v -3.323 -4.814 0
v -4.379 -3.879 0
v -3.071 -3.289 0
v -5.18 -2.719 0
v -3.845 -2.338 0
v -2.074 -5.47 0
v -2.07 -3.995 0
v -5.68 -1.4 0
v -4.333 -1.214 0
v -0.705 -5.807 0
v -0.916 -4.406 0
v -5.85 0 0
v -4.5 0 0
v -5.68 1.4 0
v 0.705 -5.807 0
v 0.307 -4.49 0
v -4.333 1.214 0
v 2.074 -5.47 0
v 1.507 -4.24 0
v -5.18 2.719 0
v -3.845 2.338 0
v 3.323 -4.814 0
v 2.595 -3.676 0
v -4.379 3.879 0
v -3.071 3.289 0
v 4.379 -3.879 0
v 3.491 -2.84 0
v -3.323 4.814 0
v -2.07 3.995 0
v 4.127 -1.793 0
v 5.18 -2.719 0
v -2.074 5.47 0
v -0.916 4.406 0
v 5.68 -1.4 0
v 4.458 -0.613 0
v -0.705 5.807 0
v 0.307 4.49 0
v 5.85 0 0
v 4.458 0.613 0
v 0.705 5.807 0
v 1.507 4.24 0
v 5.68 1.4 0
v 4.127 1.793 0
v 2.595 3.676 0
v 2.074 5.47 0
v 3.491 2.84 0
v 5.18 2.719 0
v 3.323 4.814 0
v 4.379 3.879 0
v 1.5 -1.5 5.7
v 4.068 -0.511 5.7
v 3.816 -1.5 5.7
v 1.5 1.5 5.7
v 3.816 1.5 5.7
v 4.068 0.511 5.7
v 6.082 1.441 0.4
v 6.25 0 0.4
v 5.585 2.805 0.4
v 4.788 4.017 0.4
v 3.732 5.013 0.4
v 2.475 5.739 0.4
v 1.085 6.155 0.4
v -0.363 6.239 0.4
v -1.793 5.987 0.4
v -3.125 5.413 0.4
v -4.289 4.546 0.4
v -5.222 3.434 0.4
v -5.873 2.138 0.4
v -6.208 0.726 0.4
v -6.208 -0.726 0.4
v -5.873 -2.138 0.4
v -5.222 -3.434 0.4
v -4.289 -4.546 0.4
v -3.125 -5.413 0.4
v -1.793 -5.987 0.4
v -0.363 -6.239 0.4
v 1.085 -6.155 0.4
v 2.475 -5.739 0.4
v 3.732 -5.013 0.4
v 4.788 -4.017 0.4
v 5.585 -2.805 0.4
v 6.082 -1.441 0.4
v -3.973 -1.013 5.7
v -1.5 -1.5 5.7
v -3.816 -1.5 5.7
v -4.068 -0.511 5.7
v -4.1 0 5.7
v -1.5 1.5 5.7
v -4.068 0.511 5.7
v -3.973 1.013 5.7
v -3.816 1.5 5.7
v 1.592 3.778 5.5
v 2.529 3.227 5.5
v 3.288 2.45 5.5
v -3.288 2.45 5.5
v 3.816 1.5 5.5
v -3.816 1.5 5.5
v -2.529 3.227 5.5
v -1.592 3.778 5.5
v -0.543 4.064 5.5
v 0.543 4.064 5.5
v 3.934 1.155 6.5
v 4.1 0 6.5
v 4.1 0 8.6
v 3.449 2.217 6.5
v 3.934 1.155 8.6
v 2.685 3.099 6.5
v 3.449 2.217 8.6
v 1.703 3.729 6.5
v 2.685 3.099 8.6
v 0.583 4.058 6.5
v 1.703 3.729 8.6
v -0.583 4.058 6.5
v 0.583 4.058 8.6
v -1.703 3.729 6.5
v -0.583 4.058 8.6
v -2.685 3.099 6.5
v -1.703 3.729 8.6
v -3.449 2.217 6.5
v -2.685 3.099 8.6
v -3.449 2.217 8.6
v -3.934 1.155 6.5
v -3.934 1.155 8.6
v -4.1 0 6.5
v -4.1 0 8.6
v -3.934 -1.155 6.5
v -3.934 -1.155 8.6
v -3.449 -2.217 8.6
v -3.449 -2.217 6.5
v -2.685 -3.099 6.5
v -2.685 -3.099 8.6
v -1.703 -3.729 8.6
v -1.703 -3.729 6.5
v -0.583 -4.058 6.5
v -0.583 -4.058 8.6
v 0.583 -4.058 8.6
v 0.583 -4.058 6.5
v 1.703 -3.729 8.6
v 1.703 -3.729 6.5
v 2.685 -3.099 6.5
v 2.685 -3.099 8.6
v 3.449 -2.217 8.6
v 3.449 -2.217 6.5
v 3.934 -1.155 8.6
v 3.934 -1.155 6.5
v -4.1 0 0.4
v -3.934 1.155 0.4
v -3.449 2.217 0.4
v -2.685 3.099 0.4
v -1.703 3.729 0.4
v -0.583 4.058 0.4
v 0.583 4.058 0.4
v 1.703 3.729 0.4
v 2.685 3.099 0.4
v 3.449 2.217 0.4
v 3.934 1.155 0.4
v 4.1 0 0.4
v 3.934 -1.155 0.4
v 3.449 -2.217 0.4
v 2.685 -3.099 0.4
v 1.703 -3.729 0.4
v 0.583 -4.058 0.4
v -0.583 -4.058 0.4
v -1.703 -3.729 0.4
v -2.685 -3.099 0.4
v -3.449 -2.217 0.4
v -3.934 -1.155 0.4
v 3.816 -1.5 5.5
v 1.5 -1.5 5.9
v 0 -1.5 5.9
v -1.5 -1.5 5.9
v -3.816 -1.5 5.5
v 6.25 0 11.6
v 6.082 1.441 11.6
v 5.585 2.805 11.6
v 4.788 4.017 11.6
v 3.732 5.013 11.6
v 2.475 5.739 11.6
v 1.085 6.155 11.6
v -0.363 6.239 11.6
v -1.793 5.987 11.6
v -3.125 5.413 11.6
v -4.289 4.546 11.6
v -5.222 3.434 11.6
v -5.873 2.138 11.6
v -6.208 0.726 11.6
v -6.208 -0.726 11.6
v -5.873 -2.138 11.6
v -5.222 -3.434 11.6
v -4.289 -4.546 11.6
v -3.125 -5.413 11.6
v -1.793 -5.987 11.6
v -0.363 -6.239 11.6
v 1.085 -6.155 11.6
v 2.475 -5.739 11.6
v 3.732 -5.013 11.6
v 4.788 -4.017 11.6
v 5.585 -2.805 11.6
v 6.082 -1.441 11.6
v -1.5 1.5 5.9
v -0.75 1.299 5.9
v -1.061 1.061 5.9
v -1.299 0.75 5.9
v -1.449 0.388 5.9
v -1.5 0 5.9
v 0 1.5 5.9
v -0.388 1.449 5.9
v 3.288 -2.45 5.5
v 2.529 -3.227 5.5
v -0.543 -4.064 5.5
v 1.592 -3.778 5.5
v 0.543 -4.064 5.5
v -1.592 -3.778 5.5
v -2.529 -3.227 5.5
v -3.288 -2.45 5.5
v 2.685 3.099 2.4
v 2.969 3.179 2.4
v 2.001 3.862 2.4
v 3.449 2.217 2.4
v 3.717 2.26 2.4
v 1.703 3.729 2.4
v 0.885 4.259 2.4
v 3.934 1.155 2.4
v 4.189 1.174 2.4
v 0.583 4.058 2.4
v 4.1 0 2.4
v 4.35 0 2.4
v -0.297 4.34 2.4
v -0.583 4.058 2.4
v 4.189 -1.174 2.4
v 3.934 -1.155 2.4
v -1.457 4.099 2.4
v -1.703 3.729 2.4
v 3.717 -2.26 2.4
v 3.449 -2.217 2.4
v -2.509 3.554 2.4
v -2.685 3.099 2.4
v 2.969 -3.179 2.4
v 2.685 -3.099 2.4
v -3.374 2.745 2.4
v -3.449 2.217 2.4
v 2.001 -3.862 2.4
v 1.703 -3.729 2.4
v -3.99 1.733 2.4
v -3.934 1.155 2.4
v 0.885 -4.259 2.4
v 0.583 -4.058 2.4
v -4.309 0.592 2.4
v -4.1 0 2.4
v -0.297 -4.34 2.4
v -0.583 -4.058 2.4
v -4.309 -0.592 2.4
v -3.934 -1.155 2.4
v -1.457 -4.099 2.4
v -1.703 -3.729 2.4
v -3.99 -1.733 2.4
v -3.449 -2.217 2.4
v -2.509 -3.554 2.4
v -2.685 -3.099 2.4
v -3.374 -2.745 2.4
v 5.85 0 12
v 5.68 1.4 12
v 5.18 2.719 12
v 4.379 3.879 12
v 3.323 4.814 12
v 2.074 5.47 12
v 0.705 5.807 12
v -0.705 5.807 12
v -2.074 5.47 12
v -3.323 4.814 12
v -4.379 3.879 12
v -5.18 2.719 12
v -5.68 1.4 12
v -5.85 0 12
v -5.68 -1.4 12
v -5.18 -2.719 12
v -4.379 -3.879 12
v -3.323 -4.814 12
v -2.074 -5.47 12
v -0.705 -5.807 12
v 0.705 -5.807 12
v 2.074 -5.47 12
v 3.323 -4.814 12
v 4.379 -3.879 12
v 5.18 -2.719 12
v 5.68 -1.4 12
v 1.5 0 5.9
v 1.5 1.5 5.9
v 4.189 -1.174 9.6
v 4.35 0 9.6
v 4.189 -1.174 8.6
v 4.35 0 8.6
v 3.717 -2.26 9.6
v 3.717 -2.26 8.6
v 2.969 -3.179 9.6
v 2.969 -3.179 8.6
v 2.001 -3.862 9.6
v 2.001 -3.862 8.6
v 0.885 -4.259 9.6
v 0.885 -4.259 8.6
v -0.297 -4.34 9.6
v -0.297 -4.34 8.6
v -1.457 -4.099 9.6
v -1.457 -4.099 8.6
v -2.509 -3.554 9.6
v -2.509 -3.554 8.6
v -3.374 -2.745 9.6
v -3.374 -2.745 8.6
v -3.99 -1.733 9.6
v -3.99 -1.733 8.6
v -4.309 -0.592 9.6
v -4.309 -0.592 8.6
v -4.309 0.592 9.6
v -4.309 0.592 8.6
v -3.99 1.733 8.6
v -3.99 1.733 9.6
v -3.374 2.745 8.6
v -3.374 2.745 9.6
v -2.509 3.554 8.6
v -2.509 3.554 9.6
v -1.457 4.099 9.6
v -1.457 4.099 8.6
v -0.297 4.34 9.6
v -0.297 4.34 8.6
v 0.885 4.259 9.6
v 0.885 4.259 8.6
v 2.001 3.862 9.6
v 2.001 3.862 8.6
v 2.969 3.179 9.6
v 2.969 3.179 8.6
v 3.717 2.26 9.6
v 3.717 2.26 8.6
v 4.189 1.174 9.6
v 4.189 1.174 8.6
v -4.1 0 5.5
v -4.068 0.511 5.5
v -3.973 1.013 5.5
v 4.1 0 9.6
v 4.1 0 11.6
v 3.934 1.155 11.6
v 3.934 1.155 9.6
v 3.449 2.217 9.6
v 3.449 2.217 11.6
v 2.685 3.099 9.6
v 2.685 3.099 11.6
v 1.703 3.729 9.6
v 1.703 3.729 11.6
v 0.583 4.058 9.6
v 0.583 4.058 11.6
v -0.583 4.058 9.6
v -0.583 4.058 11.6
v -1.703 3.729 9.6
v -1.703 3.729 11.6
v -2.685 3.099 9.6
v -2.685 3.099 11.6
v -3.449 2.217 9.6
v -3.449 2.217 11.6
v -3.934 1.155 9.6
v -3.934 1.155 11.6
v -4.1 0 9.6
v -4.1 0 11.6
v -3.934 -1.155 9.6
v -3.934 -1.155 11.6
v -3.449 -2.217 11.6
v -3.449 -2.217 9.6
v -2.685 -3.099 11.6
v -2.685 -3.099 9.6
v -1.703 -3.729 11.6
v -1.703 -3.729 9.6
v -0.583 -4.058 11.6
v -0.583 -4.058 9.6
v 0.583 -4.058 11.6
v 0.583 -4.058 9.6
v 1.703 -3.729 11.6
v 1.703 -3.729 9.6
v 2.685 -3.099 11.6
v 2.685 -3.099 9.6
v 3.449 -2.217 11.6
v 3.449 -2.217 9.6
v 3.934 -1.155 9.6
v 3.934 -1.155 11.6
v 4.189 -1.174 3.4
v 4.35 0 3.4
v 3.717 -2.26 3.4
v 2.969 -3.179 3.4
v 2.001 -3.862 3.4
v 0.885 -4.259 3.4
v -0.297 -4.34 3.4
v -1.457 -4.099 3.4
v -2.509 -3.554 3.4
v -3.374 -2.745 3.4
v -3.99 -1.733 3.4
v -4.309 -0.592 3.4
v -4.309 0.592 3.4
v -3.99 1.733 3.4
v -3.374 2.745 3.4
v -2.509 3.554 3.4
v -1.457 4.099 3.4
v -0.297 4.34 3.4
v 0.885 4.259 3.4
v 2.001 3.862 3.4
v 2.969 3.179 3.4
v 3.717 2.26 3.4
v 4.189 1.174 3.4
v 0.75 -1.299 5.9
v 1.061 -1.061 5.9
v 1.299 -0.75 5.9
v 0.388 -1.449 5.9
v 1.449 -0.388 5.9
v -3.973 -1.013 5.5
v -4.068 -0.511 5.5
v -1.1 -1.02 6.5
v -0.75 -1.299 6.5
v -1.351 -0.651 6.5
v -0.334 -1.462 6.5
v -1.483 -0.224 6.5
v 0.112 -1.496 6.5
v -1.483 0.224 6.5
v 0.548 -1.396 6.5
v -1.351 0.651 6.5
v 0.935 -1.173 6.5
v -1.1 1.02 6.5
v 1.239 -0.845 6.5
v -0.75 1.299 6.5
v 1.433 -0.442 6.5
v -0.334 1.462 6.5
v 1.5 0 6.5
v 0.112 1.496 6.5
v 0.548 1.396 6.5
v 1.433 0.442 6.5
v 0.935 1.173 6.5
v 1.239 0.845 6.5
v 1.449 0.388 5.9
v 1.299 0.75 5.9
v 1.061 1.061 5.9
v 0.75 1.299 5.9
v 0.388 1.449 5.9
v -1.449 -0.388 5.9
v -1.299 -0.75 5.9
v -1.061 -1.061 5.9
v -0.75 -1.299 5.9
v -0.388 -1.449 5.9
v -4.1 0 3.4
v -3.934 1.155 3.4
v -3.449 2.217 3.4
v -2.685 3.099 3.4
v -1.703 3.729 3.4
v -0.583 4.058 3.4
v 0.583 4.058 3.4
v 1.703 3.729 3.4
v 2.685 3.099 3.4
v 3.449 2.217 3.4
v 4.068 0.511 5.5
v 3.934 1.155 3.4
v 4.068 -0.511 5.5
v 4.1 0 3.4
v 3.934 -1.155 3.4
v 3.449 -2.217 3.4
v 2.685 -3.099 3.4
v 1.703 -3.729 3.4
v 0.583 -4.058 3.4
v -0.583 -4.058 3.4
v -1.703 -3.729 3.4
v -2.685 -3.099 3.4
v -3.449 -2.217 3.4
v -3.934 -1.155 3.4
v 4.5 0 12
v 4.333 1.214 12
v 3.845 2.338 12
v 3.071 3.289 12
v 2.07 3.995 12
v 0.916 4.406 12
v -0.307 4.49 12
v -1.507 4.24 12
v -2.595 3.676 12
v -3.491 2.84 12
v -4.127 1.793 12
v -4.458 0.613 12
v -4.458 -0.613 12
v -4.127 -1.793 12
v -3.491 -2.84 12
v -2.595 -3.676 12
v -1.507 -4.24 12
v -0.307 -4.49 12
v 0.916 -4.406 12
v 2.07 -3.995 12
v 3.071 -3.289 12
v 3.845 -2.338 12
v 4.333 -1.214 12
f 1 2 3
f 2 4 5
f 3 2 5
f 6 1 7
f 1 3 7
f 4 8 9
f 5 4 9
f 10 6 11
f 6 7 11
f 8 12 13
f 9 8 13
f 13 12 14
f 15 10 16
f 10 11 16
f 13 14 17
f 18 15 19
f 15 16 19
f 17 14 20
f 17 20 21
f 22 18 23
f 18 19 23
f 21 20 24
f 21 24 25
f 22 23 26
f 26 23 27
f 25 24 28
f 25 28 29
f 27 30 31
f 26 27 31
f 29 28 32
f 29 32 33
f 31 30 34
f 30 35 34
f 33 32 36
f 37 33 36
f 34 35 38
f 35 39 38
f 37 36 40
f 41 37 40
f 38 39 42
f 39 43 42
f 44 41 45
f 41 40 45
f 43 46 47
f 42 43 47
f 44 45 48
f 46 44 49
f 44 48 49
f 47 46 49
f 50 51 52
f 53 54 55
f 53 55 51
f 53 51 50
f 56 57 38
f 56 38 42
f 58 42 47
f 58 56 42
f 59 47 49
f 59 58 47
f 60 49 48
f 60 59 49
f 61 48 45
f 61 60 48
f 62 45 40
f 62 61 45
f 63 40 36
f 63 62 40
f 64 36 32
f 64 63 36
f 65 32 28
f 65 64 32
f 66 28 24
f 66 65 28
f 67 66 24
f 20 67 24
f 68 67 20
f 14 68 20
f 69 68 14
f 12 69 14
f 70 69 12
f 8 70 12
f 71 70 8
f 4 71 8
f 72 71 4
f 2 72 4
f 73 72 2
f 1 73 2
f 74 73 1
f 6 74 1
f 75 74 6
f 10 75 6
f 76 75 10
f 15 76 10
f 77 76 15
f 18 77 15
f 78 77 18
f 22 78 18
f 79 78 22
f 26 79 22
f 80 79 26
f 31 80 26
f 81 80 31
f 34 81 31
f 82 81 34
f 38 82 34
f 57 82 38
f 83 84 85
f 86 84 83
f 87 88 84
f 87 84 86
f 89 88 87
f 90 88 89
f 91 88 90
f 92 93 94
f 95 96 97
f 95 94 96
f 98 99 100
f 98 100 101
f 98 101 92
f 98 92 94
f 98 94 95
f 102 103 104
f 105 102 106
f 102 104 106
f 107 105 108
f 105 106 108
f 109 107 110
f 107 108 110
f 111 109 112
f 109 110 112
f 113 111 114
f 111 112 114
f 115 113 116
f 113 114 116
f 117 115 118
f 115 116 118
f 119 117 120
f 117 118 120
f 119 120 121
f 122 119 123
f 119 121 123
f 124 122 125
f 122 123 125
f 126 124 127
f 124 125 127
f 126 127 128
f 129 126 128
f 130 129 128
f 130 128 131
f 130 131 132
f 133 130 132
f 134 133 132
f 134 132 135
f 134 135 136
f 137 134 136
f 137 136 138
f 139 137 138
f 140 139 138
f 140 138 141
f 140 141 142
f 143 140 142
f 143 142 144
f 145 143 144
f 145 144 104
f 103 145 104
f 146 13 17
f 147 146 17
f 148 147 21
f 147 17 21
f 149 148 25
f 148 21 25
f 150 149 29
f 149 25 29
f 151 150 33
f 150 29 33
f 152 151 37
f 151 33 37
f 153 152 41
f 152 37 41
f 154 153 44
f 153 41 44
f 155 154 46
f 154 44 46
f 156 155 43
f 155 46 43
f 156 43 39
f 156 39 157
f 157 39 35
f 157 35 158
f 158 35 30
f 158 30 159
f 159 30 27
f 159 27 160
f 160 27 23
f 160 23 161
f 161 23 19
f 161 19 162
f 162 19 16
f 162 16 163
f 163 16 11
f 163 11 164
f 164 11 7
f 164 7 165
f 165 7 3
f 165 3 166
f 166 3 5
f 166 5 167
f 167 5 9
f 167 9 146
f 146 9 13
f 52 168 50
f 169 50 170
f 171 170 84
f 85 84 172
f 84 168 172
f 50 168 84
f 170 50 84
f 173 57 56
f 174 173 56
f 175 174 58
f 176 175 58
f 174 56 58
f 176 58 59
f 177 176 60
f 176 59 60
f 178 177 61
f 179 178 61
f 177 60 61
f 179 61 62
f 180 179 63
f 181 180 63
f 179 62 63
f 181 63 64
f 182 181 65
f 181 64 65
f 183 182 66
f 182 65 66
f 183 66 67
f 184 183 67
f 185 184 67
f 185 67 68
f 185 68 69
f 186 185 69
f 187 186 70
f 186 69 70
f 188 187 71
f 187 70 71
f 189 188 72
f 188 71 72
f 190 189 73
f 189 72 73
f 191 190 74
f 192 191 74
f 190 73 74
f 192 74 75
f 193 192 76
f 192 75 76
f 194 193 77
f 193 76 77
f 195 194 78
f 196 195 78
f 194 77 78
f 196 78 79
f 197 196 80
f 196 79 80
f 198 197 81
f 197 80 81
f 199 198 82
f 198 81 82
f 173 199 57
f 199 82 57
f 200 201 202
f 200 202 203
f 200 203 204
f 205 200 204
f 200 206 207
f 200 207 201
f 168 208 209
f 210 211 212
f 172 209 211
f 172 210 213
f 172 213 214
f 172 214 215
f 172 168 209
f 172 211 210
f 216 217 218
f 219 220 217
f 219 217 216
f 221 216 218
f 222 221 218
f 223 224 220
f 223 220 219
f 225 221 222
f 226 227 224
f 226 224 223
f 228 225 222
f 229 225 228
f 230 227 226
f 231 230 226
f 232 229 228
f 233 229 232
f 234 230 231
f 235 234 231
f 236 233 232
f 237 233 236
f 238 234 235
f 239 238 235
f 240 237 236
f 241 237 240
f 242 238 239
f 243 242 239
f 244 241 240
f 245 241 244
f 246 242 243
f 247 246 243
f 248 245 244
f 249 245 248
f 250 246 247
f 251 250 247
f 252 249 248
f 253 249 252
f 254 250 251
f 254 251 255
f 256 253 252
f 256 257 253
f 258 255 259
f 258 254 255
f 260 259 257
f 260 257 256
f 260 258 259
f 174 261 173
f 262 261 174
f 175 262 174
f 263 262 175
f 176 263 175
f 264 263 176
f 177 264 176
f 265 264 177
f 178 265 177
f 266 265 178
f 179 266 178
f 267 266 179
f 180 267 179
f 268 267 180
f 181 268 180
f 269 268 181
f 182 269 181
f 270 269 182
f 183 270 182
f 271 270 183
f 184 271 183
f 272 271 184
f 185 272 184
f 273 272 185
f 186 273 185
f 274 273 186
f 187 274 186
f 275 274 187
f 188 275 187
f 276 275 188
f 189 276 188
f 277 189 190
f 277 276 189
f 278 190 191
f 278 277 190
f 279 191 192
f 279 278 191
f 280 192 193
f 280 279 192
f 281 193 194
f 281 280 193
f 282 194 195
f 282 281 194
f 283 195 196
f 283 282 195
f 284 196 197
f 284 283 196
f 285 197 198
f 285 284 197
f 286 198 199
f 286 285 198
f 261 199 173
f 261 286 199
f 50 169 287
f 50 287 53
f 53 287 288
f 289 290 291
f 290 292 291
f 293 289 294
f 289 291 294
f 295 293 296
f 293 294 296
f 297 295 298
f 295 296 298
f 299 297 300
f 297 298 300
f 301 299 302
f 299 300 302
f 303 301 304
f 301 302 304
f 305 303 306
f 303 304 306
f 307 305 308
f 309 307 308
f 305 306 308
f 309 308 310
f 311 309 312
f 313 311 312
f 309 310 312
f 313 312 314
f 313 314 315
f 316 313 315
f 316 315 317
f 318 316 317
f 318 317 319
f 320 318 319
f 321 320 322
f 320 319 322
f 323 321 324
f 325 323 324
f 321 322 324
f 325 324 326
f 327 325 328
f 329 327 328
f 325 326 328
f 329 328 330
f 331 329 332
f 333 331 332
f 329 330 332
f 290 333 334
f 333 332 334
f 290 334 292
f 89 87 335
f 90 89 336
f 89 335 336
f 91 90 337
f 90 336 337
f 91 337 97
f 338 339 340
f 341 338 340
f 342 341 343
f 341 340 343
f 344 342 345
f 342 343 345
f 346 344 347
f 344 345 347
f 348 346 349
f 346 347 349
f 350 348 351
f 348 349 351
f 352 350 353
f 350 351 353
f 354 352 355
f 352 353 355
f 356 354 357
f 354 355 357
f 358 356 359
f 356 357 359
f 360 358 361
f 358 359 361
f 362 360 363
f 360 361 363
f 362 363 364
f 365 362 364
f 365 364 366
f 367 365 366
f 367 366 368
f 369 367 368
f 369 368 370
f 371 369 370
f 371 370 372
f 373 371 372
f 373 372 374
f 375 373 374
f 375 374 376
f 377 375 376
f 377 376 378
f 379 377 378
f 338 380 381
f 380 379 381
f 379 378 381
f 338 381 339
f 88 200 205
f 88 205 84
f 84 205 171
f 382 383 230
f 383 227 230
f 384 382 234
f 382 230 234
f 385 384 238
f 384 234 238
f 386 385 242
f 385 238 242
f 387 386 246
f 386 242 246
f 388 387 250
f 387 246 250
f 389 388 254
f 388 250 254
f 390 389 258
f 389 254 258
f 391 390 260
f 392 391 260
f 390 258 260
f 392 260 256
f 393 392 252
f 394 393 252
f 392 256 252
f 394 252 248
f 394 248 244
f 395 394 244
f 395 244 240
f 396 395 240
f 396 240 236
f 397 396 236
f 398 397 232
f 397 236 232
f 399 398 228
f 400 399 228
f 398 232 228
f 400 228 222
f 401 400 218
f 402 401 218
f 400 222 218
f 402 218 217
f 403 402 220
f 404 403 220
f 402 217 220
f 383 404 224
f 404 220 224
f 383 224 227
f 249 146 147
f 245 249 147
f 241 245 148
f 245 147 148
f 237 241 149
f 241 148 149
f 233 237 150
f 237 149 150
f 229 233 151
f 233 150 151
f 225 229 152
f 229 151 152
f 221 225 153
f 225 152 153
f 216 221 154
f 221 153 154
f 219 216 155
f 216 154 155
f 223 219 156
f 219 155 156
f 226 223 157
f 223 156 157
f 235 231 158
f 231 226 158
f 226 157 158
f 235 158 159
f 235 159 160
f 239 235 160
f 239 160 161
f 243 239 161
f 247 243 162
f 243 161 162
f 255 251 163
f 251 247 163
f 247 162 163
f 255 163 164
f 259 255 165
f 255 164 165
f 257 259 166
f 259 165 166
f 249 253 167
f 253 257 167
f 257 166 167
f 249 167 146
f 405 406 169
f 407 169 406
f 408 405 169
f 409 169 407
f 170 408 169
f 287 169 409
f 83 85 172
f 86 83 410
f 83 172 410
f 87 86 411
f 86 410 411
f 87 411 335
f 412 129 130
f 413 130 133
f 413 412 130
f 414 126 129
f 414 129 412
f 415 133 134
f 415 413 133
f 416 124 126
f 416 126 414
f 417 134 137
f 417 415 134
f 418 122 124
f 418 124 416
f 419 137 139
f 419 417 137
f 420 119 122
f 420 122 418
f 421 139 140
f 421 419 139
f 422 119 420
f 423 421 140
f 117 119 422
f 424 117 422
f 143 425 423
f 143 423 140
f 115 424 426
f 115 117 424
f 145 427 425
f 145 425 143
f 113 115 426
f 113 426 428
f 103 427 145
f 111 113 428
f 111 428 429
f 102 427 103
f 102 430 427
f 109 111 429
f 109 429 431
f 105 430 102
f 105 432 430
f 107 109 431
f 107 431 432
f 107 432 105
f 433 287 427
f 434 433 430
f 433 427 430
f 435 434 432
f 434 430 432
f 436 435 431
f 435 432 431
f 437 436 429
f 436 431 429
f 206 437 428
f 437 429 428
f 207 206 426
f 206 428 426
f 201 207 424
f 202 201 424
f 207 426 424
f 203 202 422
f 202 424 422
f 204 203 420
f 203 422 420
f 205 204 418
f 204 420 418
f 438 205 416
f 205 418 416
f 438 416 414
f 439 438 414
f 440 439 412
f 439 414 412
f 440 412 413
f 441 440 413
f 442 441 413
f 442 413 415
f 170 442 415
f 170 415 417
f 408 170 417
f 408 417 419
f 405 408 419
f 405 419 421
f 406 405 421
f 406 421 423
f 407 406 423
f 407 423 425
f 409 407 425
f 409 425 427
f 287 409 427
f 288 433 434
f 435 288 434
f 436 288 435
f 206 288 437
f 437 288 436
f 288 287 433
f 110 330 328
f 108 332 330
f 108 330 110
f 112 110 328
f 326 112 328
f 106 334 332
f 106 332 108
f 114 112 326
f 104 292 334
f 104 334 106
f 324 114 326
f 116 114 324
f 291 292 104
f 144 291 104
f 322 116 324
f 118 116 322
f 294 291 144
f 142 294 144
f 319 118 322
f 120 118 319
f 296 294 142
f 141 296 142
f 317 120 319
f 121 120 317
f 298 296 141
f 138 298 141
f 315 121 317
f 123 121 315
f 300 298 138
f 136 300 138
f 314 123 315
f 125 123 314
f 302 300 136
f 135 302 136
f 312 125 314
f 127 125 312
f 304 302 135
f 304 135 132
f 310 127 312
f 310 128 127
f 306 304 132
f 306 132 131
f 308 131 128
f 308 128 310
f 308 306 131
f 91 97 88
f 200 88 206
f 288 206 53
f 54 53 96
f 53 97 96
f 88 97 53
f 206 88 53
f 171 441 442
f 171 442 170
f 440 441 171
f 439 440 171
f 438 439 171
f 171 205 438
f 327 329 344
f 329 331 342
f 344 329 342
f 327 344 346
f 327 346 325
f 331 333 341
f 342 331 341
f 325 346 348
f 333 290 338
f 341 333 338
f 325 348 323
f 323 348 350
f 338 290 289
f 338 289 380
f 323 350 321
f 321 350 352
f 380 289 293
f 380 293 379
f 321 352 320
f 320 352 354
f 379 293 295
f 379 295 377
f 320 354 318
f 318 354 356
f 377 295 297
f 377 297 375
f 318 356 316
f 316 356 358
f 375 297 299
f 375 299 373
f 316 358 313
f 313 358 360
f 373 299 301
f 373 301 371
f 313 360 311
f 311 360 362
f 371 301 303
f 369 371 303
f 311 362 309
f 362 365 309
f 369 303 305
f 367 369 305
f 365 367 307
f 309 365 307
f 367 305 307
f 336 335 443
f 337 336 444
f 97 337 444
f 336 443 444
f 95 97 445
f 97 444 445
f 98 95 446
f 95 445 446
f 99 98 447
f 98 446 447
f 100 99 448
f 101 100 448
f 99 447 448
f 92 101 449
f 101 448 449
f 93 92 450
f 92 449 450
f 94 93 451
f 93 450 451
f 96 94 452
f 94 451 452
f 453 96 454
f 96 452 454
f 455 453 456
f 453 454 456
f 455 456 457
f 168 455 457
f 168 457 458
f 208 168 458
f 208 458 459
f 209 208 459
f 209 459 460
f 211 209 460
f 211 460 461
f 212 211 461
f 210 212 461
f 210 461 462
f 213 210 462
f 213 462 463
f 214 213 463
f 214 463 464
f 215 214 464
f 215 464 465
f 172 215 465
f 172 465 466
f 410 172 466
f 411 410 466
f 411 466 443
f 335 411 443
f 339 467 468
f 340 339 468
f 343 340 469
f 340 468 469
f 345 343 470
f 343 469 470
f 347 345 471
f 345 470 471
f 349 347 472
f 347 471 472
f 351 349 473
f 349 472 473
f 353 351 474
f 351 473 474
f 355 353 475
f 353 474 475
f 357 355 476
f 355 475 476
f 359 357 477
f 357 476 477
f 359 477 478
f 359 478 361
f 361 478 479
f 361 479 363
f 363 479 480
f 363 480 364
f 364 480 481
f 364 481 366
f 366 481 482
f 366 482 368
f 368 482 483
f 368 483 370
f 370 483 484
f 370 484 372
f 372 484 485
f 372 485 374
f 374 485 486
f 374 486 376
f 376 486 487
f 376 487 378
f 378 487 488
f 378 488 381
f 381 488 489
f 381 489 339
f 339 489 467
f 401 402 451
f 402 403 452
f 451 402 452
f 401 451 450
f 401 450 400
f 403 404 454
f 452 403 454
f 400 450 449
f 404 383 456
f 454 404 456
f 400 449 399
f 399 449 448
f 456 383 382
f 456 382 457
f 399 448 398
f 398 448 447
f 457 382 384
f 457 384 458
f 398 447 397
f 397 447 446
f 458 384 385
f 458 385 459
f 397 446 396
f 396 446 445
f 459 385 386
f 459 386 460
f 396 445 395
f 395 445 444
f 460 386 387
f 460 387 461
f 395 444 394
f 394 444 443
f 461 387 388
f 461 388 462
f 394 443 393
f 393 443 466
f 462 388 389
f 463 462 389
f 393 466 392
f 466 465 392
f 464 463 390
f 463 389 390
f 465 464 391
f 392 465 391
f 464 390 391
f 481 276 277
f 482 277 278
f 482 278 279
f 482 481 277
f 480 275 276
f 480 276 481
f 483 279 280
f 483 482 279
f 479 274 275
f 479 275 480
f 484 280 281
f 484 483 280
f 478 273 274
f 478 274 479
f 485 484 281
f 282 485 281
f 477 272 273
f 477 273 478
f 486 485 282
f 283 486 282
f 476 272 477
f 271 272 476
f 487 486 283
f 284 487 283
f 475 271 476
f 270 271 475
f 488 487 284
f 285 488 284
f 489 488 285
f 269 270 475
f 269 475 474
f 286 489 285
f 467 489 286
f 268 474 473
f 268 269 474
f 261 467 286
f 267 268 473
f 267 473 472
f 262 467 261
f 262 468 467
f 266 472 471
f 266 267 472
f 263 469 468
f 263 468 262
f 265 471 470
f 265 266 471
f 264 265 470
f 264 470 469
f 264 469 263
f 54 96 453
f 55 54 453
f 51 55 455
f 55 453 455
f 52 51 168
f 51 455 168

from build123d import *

# Parameters (mm, degrees)
SKETCH1_R           = 6.25
BOSS_EXTRUDE1_DEPTH = 12
CUT_EXTRUDE1_REACH  = 14
SKETCH2_R           = 1.5
SKETCH3_R           = 4.1
CUT_EXTRUDE2_DEPTH  = 5.5
SKETCH4_R           = 4.1
CUT_EXTRUDE3_DEPTH  = 5.5
SKETCH5_W           = 0.25
SKETCH5_H           = 1
CUT_EXTRUDE4_DEPTH  = 0.4
BOSS_EXTRUDE2_DEPTH = 0.2
CHAMFER1_SIZE       = 0.4


with BuildPart() as part:
    # Sketch1 → Boss-Extrude1 (new body)
    with BuildSketch(Plane.XY):
        Circle(SKETCH1_R)
    extrude(amount=BOSS_EXTRUDE1_DEPTH)

    # Sketch2 → Cut-Extrude1 (cut, up to next)
    with BuildSketch(Plane.XY.offset(12), mode=Mode.PRIVATE) as cut_extrude1_sk1:
        Circle(SKETCH2_R)
    cut_extrude1_tool1 = extrude(cut_extrude1_sk1.sketch, amount=-CUT_EXTRUDE1_REACH, mode=Mode.PRIVATE) & part.part
    add(cut_extrude1_tool1.solids().sort_by_distance((0, 0, 12))[0], mode=Mode.SUBTRACT)

    # Sketch3 → Cut-Extrude2 (cut)
    with BuildSketch(Plane.XY.offset(12)):
        Circle(SKETCH3_R)
    extrude(amount=-CUT_EXTRUDE2_DEPTH, mode=Mode.SUBTRACT)

    # Sketch4 → Cut-Extrude3 (cut)
    with BuildSketch(Plane(origin=(0, 0, 0), x_dir=(-1, 0, 0), z_dir=(0, 0, -1))):
        Circle(SKETCH4_R)
    extrude(amount=-CUT_EXTRUDE3_DEPTH, mode=Mode.SUBTRACT)

    # Sketch5 → Cut-Revolve1 (revolve, cut)
    with BuildSketch(Plane(origin=(0, 0, 0), x_dir=(1, 0, 0), z_dir=(0, 1, 0))):
        with Locations((4.225, -2.9)):
            Rectangle(SKETCH5_W, SKETCH5_H)
        with Locations((4.225, -9.1)):
            Rectangle(SKETCH5_W, SKETCH5_H)
    revolve(axis=Axis((0, 0, 12), (0, 0, -1)), mode=Mode.SUBTRACT)

    # Sketch6 → Cut-Extrude4 (cut)
    with BuildSketch(Plane(origin=(0, 0, 5.5), x_dir=(-1, 0, 0), z_dir=(0, 0, -1))):
        with BuildLine():
            ThreePointArc((-3.815756806, 1.5), (-4.1, 0), (-3.815756806, -1.5))
            Line((-3.815756806, -1.5), (0, -1.5))
            ThreePointArc((0, -1.5), (-1.5, 0), (0, 1.5))
            Line((0, 1.5), (-3.815756806, 1.5))
        make_face()
        with BuildLine():
            ThreePointArc((1.5, 0), (1.060660172, -1.060660172), (0, -1.5))
            Line((0, -1.5), (3.815756806, -1.5))
            ThreePointArc((3.815756806, -1.5), (4.028312482, -0.763346938), (4.1, 0))
            ThreePointArc((4.1, 0), (4.028312482, 0.763346938), (3.815756806, 1.5))
            Line((3.815756806, 1.5), (0, 1.5))
            ThreePointArc((0, 1.5), (1.060660172, 1.060660172), (1.5, 0))
        make_face()
    extrude(amount=-CUT_EXTRUDE4_DEPTH, mode=Mode.SUBTRACT)

    # Sketch7 → Boss-Extrude2 (add)
    with BuildSketch(Plane(origin=(0, 0, 5.9), x_dir=(-1, 0, 0), z_dir=(0, 0, -1))):
        with BuildLine():
            Line((-1.5, 0), (-1.5, 1.5))
            Line((-1.5, 1.5), (-3.815756806, 1.5))
            ThreePointArc((-3.815756806, 1.5), (-4.1, 0), (-3.815756806, -1.5))
            Line((-3.815756806, -1.5), (-1.5, -1.5))
            Line((-1.5, -1.5), (-1.5, 0))
        make_face()
        with BuildLine():
            ThreePointArc((3.815756806, -1.5), (4.1, 0), (3.815756806, 1.5))
            Line((3.815756806, 1.5), (1.5, 1.5))
            Line((1.5, 1.5), (1.5, 0))
            Line((1.5, 0), (1.5, -1.5))
            Line((1.5, -1.5), (3.815756806, -1.5))
        make_face()
    extrude(amount=BOSS_EXTRUDE2_DEPTH)

    # Chamfer1
    chamfer1_edges = [part.edges().sort_by_distance(p)[0] for p in [
        (-4.1, 0, 12),
        (4.1, 0, 0),
        (-6.25, 0, 0),
        (-6.25, 0, 12),
    ]]
    chamfer(chamfer1_edges, length=CHAMFER1_SIZE)


solid = part.part
